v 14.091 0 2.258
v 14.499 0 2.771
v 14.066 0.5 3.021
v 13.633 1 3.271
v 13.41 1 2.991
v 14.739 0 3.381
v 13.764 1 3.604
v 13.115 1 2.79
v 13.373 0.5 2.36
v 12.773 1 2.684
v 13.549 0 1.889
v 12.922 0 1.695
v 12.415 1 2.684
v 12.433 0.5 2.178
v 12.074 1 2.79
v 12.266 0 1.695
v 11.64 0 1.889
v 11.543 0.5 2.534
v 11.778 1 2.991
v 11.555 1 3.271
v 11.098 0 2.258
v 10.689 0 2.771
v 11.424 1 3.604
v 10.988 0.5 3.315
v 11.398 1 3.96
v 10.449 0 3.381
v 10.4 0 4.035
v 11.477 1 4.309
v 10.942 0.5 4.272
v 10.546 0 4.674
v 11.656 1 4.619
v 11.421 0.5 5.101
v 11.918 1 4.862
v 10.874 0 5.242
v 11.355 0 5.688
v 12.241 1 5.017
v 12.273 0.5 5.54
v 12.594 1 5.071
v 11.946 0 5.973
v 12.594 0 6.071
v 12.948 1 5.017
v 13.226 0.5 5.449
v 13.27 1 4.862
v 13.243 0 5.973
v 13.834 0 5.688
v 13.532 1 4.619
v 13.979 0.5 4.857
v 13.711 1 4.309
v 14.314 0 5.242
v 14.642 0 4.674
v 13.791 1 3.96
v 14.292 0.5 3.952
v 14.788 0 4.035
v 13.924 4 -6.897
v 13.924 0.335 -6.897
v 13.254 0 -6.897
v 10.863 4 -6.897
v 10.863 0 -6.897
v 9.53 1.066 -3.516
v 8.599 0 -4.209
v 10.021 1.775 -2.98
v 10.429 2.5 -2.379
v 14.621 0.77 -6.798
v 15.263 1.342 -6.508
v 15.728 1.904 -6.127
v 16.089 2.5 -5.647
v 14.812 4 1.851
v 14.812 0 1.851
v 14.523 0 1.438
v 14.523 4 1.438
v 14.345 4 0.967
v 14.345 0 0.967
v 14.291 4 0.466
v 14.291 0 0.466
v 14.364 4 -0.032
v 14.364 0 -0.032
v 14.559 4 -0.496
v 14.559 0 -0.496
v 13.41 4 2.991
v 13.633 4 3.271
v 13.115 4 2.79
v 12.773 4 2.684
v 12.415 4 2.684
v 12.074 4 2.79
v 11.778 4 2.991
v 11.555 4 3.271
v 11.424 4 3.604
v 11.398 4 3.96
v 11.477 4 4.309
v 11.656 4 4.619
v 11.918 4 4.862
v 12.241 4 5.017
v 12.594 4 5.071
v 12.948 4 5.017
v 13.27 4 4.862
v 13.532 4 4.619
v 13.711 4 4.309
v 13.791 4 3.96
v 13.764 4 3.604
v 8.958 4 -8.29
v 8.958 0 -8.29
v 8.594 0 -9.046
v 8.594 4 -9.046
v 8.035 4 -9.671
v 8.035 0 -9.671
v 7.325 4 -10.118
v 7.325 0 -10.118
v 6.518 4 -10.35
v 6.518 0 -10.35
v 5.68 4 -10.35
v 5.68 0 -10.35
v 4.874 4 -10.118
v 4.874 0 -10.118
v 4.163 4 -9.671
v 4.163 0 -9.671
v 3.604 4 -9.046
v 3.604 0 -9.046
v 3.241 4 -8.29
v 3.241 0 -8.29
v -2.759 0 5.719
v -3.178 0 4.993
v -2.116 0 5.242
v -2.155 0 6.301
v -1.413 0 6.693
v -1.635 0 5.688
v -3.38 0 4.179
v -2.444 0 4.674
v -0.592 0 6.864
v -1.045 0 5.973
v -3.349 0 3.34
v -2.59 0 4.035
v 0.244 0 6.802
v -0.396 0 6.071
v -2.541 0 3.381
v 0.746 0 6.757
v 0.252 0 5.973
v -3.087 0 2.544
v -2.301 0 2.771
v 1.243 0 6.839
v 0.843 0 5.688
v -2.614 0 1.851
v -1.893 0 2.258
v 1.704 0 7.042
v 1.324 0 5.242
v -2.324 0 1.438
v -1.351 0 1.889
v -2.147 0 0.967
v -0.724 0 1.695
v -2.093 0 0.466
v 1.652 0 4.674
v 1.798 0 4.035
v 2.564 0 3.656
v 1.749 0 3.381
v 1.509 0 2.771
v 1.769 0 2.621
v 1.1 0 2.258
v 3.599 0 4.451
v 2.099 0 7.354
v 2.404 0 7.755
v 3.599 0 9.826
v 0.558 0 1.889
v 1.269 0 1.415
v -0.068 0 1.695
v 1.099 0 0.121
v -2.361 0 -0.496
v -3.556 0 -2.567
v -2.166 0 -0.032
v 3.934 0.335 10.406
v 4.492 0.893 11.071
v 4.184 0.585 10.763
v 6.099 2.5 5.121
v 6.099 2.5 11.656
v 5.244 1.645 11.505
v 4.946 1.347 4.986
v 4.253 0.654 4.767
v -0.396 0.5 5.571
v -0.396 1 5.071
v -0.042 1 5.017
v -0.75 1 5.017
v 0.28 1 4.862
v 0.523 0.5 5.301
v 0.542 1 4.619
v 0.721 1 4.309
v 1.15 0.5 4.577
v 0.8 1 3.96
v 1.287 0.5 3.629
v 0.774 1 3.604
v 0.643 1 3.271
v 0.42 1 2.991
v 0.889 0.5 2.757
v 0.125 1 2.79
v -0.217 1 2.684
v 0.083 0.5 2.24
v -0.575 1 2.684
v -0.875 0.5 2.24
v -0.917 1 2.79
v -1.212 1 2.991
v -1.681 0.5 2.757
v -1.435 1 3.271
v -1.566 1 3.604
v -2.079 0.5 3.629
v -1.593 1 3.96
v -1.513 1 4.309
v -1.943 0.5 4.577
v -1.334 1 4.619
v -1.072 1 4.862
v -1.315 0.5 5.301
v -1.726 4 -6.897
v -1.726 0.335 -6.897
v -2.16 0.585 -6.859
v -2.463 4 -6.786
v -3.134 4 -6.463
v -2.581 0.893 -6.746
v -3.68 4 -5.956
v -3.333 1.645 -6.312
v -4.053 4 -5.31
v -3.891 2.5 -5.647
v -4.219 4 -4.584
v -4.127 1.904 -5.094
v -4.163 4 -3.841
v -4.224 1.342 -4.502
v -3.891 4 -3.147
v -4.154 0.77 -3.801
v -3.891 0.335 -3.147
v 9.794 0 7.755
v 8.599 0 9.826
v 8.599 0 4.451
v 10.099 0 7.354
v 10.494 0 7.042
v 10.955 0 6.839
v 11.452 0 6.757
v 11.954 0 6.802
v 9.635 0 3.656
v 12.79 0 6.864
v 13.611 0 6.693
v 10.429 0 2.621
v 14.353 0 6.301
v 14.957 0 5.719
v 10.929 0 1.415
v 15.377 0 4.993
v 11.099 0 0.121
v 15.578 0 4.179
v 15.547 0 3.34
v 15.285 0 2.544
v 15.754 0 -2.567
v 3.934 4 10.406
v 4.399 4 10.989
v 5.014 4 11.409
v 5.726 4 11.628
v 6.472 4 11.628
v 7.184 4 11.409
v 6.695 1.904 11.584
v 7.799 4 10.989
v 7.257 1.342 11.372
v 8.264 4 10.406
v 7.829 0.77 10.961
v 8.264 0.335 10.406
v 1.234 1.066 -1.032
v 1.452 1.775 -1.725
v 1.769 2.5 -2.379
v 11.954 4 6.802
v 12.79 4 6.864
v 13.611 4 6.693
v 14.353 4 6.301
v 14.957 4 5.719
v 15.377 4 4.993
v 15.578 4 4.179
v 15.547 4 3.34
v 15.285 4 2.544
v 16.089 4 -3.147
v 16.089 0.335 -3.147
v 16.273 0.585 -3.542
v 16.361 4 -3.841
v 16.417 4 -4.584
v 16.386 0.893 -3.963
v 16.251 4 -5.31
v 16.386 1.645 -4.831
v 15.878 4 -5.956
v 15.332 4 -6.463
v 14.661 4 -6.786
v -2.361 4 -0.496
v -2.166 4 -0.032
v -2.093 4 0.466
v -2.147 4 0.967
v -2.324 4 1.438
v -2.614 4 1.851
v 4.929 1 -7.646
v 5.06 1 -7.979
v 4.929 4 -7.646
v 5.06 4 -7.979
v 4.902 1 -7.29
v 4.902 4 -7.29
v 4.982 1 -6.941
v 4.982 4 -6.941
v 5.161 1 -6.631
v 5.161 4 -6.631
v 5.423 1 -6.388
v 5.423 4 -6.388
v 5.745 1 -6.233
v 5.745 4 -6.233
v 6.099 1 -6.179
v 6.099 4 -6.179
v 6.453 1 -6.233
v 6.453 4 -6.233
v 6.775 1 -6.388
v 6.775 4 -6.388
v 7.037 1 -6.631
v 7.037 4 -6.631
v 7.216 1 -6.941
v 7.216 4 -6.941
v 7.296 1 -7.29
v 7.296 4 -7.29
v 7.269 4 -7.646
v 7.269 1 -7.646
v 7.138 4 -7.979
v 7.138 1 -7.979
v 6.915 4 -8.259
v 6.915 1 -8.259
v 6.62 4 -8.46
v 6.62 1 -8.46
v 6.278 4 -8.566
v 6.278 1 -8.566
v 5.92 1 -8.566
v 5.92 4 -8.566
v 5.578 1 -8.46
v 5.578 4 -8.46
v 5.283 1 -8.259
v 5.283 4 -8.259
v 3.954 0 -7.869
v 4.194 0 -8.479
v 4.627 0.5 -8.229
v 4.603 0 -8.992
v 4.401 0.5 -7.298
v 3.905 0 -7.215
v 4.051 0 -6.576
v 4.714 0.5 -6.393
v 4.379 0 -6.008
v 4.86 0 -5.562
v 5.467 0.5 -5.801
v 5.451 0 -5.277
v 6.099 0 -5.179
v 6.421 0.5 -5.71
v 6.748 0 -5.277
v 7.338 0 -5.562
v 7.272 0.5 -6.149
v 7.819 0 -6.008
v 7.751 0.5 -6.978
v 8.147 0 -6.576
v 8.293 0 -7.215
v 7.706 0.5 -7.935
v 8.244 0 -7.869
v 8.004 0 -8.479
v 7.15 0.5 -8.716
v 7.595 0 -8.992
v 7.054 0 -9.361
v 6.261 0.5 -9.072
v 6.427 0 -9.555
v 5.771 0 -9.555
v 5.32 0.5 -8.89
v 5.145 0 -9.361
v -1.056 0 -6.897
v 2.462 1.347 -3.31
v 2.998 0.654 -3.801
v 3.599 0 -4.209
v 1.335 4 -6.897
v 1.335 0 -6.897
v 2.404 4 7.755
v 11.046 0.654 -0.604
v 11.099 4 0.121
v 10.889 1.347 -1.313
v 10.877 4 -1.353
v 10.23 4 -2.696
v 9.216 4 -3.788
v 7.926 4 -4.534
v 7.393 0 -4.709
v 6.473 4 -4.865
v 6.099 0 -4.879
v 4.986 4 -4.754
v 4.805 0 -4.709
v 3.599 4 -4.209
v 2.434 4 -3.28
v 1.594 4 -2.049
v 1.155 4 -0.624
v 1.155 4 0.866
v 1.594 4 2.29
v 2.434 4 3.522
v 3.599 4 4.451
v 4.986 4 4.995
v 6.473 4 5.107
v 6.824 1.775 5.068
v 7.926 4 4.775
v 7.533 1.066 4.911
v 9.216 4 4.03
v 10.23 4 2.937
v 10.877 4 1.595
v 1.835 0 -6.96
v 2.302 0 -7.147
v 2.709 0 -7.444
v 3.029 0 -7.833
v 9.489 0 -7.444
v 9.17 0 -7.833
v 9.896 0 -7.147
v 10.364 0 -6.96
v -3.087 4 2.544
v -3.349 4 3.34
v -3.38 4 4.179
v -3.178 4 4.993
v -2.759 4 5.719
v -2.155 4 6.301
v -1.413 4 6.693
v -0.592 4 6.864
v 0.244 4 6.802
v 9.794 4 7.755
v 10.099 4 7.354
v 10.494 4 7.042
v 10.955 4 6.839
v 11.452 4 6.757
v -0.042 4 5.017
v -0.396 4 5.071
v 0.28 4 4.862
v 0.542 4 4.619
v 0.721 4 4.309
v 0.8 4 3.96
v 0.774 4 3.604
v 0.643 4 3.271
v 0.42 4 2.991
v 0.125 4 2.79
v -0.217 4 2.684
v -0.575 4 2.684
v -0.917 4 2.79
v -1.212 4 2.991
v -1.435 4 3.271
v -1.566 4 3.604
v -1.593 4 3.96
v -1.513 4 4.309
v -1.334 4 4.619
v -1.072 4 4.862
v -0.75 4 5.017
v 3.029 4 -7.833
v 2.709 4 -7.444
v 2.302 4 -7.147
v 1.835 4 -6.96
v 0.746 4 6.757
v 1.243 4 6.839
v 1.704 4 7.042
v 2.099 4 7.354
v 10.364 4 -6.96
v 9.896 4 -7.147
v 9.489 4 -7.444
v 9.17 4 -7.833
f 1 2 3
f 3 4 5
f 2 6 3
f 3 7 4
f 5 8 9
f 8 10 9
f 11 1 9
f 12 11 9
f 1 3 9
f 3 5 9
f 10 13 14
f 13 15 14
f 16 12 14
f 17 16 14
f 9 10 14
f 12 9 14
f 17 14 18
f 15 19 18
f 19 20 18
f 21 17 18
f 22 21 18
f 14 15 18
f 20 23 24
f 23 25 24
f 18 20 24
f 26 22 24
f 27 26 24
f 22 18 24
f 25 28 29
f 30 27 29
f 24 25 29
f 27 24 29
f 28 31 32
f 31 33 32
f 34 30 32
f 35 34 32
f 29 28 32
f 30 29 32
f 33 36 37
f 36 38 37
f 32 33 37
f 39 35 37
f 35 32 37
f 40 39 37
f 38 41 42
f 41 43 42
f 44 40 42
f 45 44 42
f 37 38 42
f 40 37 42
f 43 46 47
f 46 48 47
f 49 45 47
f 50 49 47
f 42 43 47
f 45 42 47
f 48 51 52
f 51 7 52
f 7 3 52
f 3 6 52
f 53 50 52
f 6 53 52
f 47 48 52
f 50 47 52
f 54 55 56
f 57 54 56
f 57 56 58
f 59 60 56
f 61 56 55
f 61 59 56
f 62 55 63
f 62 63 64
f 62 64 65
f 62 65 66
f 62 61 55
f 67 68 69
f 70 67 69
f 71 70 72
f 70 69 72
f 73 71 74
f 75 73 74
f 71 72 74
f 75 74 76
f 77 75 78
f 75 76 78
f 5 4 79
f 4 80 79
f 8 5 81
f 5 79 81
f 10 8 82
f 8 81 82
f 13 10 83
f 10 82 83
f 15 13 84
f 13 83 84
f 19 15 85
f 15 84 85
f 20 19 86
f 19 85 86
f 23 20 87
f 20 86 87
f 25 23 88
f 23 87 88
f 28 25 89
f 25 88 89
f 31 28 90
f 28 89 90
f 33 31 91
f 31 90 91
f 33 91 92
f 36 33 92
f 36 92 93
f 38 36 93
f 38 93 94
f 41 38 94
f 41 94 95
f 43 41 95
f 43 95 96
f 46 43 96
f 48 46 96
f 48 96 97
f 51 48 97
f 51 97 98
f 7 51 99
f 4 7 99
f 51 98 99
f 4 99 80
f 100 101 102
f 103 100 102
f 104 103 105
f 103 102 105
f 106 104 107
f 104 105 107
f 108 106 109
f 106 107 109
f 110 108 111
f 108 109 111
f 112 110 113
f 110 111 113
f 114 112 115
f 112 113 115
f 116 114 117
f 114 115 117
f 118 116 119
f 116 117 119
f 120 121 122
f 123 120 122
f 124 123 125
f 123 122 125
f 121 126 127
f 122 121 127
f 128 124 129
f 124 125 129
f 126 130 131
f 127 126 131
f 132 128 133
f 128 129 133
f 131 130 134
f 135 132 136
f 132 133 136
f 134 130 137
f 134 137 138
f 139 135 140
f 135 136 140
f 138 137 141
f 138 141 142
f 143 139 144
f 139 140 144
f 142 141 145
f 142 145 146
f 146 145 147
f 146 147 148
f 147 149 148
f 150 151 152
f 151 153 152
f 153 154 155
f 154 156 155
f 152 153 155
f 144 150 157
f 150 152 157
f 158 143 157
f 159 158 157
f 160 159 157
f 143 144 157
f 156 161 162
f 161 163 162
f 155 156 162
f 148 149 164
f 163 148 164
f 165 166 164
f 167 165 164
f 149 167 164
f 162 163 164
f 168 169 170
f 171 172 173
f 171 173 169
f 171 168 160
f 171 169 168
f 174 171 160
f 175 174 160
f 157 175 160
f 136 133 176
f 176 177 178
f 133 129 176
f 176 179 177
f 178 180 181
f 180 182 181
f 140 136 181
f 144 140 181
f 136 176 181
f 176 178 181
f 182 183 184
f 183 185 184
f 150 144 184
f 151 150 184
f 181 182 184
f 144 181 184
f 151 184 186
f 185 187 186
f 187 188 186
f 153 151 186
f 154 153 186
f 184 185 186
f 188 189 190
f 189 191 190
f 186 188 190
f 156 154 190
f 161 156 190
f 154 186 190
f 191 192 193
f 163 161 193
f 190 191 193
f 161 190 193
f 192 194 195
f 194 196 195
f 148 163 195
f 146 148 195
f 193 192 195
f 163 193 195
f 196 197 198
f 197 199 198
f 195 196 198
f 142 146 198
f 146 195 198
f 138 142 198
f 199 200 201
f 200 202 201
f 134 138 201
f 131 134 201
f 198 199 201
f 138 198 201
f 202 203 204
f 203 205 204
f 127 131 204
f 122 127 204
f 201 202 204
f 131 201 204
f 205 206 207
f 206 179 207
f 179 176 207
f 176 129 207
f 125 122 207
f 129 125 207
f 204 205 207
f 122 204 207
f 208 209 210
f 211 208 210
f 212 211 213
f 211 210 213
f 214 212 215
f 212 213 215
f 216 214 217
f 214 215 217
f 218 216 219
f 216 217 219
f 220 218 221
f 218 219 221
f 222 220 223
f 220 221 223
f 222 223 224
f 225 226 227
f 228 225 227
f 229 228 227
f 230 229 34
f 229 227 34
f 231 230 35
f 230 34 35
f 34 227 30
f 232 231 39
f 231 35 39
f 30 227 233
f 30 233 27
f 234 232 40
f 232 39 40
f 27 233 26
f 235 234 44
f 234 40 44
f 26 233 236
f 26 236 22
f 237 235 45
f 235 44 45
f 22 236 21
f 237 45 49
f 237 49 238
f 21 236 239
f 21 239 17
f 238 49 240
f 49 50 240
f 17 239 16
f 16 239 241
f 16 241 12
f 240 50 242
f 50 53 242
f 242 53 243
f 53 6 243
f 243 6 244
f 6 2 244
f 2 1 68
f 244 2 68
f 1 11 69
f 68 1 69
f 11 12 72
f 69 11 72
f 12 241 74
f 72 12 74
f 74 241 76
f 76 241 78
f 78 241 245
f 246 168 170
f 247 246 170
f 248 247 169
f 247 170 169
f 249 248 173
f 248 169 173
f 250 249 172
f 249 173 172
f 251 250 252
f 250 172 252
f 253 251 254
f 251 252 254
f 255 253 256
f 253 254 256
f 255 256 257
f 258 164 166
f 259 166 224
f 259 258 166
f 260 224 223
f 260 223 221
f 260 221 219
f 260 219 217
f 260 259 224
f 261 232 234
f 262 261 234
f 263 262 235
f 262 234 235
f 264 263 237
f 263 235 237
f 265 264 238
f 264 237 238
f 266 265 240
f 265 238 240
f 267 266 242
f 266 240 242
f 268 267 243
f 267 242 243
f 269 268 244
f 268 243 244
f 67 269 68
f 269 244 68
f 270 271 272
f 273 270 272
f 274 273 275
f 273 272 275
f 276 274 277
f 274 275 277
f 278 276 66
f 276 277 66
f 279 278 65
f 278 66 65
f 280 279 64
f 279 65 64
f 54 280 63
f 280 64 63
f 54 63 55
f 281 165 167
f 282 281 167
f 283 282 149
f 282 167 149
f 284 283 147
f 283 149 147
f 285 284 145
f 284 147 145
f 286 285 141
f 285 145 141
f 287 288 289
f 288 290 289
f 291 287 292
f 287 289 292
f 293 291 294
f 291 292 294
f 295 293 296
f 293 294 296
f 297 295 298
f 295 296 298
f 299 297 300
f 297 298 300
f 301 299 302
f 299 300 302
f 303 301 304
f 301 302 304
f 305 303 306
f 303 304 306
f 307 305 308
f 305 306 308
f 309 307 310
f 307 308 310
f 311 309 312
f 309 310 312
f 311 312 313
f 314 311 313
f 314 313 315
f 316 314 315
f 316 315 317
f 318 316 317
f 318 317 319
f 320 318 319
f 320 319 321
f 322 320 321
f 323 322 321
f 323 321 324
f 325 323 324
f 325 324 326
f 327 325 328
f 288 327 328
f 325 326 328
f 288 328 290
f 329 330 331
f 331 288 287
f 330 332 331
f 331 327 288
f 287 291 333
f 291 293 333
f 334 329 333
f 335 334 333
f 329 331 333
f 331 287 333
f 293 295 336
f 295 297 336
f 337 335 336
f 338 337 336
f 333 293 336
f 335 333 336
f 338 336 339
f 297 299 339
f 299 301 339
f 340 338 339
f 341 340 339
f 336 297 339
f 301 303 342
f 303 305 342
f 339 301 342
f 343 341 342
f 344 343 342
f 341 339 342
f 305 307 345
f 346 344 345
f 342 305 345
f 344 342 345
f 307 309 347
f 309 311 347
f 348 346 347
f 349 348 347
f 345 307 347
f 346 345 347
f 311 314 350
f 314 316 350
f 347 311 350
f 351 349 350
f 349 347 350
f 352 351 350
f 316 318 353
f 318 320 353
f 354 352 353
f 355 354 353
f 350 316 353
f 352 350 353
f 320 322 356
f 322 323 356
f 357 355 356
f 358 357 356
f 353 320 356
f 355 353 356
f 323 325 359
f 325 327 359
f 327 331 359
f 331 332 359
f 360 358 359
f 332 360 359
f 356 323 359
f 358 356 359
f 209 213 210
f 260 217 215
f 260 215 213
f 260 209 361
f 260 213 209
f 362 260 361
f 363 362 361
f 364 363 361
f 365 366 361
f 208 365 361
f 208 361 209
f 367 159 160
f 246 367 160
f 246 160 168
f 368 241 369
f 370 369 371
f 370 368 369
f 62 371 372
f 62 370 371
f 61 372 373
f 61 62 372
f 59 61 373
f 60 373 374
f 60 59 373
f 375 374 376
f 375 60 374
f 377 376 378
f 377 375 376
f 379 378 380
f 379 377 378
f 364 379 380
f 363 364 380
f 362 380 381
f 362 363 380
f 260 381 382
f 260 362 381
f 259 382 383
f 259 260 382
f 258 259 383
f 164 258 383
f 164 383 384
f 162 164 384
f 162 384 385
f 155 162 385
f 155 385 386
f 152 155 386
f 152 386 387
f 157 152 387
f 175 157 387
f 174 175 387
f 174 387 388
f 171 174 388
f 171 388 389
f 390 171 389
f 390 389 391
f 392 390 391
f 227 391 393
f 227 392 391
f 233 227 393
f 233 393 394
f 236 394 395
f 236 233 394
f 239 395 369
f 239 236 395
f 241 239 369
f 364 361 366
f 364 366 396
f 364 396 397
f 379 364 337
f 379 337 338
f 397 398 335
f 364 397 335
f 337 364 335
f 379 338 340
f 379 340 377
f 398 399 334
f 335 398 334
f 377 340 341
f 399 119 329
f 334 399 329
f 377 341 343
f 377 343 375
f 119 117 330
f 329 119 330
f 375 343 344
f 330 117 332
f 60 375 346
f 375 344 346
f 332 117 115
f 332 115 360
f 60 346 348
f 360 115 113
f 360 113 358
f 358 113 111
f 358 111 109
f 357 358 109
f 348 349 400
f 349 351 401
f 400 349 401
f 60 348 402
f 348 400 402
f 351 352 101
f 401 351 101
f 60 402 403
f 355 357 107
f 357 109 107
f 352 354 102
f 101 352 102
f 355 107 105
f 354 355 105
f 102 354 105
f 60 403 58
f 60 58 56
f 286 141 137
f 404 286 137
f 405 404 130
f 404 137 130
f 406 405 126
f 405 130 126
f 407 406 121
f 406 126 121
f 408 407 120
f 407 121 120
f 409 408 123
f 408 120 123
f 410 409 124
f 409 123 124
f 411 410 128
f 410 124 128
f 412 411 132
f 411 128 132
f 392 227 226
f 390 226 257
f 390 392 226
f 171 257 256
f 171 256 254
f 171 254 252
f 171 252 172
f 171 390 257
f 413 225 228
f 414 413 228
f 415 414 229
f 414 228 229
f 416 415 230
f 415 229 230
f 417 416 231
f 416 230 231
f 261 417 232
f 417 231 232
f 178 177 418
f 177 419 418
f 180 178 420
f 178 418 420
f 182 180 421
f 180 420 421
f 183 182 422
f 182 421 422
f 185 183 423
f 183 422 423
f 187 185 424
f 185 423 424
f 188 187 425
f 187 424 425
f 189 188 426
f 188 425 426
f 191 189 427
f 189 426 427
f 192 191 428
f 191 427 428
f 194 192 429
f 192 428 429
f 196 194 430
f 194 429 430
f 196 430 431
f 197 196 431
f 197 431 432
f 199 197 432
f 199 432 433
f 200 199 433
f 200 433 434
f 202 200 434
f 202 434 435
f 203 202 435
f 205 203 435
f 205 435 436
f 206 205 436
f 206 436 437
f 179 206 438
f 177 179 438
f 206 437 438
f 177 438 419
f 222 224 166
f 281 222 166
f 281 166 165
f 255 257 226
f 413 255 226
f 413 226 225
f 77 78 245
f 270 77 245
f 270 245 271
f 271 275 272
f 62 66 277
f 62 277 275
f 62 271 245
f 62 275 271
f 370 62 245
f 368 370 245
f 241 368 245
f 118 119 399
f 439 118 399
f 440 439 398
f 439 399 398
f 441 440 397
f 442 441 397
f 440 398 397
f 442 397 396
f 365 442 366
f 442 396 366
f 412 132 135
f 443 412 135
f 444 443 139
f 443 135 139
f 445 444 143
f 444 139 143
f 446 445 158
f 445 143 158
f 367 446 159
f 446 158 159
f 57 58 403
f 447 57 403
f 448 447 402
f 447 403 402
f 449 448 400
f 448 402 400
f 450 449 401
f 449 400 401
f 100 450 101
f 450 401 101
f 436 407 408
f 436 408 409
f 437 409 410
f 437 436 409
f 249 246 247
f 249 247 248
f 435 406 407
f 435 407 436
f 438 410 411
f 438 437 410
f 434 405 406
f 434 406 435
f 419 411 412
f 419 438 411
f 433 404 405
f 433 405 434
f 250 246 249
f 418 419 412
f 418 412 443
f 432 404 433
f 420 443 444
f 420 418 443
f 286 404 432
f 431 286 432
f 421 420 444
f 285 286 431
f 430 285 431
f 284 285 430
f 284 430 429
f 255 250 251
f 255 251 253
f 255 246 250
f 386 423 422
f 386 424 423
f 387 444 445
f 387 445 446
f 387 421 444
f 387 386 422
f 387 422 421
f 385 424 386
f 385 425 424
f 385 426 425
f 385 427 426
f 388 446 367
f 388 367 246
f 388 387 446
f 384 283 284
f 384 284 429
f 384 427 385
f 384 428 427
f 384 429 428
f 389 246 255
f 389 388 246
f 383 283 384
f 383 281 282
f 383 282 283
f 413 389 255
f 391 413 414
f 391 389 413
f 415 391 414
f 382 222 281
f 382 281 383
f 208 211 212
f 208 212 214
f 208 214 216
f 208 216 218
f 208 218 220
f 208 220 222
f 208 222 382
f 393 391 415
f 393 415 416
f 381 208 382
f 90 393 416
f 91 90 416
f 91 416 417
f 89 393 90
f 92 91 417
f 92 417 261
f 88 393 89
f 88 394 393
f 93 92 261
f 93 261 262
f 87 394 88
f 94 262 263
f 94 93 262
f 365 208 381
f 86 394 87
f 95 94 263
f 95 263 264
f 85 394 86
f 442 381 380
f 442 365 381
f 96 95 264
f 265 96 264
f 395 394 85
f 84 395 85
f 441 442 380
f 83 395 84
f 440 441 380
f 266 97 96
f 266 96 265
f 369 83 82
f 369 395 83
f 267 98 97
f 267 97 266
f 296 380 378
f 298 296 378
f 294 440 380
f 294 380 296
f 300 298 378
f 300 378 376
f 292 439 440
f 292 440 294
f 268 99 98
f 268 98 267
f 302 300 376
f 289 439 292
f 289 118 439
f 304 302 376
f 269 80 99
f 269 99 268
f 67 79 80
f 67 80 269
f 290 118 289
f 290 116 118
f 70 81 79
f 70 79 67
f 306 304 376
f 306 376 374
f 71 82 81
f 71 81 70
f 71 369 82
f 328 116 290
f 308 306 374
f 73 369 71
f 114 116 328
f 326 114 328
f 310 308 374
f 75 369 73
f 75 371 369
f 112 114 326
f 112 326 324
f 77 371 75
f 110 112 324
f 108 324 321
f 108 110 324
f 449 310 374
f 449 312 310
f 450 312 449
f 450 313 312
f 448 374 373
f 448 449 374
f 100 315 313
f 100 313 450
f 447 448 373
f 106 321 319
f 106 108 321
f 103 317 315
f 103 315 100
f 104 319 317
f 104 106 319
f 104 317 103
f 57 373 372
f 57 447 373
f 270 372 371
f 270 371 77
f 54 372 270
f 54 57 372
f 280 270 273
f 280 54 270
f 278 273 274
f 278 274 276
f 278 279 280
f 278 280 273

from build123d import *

# Parameters (mm, degrees)
SKETCH1_R                                       = 5
EXTRUDE1_DEPTH                                  = 4
CSK_FOR_M2_OVAL_HEAD_MACHINE_SCREW1_D           = 2.4
CSK_FOR_M2_OVAL_HEAD_MACHINE_SCREW1_CSINK_D     = 4.4
CSK_FOR_M2_OVAL_HEAD_MACHINE_SCREW1_CSINK_ANGLE = 90
CIRPATTERN2_COUNT                               = 3
EXTRUDE4_START                                  = 4.45086
EXTRUDE4_DEPTH                                  = 7.205259
EXTRUDE5_START                                  = 4.330127
EXTRUDE5_DEPTH                                  = 7.205258
EXTRUDE6_START                                  = 4.330127
EXTRUDE6_DEPTH                                  = 7.205258


with BuildPart() as part:
    # Sketch1 → Extrude1 (new body)
    with BuildSketch(Plane(origin=(0, 0, 0), x_dir=(1, 0, 0), z_dir=(0, 1, 0))):
        with BuildLine():
            Line((-3.89089061, 3.146959138), (-2.360502052, 0.4962484))
            ThreePointArc((-2.360502052, 0.4962484), (-2.104118872, -0.718531203), (-2.613989574, -1.850544314))
            ThreePointArc((-2.613989574, -1.850544314), (-2.994220859, -5.370733384), (0.244467944, -6.801537968))
            ThreePointArc((0.244467944, -6.801537968), (1.479755407, -6.925983542), (2.403593813, -7.75540769))
            Line((2.403593813, -7.75540769), (3.933982371, -10.406118428))
            ThreePointArc((3.933982371, -10.406118428), (6.099045881, -11.656118428), (8.26410939, -10.406118428))
            Line((8.26410939, -10.406118428), (9.794497948, -7.75540769))
            ThreePointArc((9.794497948, -7.75540769), (10.718336354, -6.925983542), (11.953623817, -6.801537968))
            ThreePointArc((11.953623817, -6.801537968), (15.192312621, -5.370733384), (14.812081336, -1.850544314))
            ThreePointArc((14.812081336, -1.850544314), (14.302210633, -0.718531203), (14.558593813, 0.4962484))
            Line((14.558593813, 0.4962484), (16.088982371, 3.146959138))
            ThreePointArc((16.088982371, 3.146959138), (16.088982371, 5.646959138), (13.923918862, 6.896959138))
            Line((13.923918862, 6.896959138), (10.863141746, 6.896959138))
            ThreePointArc((10.863141746, 6.896959138), (9.68292016, 7.282314592), (8.9575034, 8.289882129))
            ThreePointArc((8.9575034, 8.289882129), (6.099045881, 10.379266616), (3.240588362, 8.289882129))
            ThreePointArc((3.240588362, 8.289882129), (2.515171602, 7.282314592), (1.334950016, 6.896959138))
            Line((1.334950016, 6.896959138), (-1.7258271, 6.896959138))
            ThreePointArc((-1.7258271, 6.896959138), (-3.89089061, 5.646959138), (-3.89089061, 3.146959138))
        make_face()
        with Locations((6.099045881, -0.120733384)):
            Circle(SKETCH1_R, mode=Mode.SUBTRACT)
    extrude(amount=EXTRUDE1_DEPTH)

    # CSK for M2 Oval Head Machine Screw1 (through all)
    with Locations(Plane(origin=(-0.396144648, 0, 3.870733384), x_dir=(0, 0, -1), z_dir=(0, -1, 0))):
        with Locations((0, 0)):
            csk_for_m2_oval_head_machine_screw1 = CounterSinkHole(CSK_FOR_M2_OVAL_HEAD_MACHINE_SCREW1_D / 2, CSK_FOR_M2_OVAL_HEAD_MACHINE_SCREW1_CSINK_D / 2, counter_sink_angle=CSK_FOR_M2_OVAL_HEAD_MACHINE_SCREW1_CSINK_ANGLE)

    # CirPattern2: CSK for M2 Oval Head Machine Screw1 ×3 about axis
    cirpattern2_axis = Axis((6.099045881, 0, 0.120733384), (0, 1, 0))
    for i in range(1, CIRPATTERN2_COUNT):
        add(csk_for_m2_oval_head_machine_screw1.rotate(cirpattern2_axis, i * 360 / CIRPATTERN2_COUNT), mode=Mode.SUBTRACT)

    # GrooveSketch → Extrude4 (cut)
    with BuildSketch(Plane.XY.offset(EXTRUDE4_START)):
        Polygon((34.668922444, -26.069876563), (8.599045881, 0), (6.099045881, 2.5), (3.599045881, 0), (-22.470830682, -26.069876563), (-22.470830682, -99.806622573), (34.668922444, -99.806622573), align=None)
    extrude(amount=EXTRUDE4_DEPTH, mode=Mode.SUBTRACT)

    # Sketch9 → Extrude5 (cut)
    with BuildSketch(Plane(origin=(4.6265635, 0, 2.671147682), x_dir=(-0.5, 0, 0.866025404), z_dir=(-0.866025404, 0, -0.5)).offset(EXTRUDE5_START)):
        Polygon((32.223222882, -32.668187644), (-0.444964763, 0), (-2.944964763, 2.5), (-5.444964763, 0), (-38.113152407, -32.668187644), (-38.113152407, -125.067775694), (32.223222882, -125.067775694), align=None)
    extrude(amount=EXTRUDE5_DEPTH, mode=Mode.SUBTRACT)

    # Sketch10 → Extrude6 (cut)
    with BuildSketch(Plane(origin=(4.522005322, 0, -2.61078099), x_dir=(-0.5, 0, -0.866025404), z_dir=(0.866025404, 0, -0.5)).offset(EXTRUDE6_START)):
        Polygon((32.014106526, -32.668187644), (-0.654081118, 0), (-3.154081118, 2.5), (-5.654081118, 0), (-38.322268763, -32.668187644), (-38.322268763, -125.067775694), (32.014106526, -125.067775694), align=None)
    extrude(amount=EXTRUDE6_DEPTH, mode=Mode.SUBTRACT)


solid = part.part
